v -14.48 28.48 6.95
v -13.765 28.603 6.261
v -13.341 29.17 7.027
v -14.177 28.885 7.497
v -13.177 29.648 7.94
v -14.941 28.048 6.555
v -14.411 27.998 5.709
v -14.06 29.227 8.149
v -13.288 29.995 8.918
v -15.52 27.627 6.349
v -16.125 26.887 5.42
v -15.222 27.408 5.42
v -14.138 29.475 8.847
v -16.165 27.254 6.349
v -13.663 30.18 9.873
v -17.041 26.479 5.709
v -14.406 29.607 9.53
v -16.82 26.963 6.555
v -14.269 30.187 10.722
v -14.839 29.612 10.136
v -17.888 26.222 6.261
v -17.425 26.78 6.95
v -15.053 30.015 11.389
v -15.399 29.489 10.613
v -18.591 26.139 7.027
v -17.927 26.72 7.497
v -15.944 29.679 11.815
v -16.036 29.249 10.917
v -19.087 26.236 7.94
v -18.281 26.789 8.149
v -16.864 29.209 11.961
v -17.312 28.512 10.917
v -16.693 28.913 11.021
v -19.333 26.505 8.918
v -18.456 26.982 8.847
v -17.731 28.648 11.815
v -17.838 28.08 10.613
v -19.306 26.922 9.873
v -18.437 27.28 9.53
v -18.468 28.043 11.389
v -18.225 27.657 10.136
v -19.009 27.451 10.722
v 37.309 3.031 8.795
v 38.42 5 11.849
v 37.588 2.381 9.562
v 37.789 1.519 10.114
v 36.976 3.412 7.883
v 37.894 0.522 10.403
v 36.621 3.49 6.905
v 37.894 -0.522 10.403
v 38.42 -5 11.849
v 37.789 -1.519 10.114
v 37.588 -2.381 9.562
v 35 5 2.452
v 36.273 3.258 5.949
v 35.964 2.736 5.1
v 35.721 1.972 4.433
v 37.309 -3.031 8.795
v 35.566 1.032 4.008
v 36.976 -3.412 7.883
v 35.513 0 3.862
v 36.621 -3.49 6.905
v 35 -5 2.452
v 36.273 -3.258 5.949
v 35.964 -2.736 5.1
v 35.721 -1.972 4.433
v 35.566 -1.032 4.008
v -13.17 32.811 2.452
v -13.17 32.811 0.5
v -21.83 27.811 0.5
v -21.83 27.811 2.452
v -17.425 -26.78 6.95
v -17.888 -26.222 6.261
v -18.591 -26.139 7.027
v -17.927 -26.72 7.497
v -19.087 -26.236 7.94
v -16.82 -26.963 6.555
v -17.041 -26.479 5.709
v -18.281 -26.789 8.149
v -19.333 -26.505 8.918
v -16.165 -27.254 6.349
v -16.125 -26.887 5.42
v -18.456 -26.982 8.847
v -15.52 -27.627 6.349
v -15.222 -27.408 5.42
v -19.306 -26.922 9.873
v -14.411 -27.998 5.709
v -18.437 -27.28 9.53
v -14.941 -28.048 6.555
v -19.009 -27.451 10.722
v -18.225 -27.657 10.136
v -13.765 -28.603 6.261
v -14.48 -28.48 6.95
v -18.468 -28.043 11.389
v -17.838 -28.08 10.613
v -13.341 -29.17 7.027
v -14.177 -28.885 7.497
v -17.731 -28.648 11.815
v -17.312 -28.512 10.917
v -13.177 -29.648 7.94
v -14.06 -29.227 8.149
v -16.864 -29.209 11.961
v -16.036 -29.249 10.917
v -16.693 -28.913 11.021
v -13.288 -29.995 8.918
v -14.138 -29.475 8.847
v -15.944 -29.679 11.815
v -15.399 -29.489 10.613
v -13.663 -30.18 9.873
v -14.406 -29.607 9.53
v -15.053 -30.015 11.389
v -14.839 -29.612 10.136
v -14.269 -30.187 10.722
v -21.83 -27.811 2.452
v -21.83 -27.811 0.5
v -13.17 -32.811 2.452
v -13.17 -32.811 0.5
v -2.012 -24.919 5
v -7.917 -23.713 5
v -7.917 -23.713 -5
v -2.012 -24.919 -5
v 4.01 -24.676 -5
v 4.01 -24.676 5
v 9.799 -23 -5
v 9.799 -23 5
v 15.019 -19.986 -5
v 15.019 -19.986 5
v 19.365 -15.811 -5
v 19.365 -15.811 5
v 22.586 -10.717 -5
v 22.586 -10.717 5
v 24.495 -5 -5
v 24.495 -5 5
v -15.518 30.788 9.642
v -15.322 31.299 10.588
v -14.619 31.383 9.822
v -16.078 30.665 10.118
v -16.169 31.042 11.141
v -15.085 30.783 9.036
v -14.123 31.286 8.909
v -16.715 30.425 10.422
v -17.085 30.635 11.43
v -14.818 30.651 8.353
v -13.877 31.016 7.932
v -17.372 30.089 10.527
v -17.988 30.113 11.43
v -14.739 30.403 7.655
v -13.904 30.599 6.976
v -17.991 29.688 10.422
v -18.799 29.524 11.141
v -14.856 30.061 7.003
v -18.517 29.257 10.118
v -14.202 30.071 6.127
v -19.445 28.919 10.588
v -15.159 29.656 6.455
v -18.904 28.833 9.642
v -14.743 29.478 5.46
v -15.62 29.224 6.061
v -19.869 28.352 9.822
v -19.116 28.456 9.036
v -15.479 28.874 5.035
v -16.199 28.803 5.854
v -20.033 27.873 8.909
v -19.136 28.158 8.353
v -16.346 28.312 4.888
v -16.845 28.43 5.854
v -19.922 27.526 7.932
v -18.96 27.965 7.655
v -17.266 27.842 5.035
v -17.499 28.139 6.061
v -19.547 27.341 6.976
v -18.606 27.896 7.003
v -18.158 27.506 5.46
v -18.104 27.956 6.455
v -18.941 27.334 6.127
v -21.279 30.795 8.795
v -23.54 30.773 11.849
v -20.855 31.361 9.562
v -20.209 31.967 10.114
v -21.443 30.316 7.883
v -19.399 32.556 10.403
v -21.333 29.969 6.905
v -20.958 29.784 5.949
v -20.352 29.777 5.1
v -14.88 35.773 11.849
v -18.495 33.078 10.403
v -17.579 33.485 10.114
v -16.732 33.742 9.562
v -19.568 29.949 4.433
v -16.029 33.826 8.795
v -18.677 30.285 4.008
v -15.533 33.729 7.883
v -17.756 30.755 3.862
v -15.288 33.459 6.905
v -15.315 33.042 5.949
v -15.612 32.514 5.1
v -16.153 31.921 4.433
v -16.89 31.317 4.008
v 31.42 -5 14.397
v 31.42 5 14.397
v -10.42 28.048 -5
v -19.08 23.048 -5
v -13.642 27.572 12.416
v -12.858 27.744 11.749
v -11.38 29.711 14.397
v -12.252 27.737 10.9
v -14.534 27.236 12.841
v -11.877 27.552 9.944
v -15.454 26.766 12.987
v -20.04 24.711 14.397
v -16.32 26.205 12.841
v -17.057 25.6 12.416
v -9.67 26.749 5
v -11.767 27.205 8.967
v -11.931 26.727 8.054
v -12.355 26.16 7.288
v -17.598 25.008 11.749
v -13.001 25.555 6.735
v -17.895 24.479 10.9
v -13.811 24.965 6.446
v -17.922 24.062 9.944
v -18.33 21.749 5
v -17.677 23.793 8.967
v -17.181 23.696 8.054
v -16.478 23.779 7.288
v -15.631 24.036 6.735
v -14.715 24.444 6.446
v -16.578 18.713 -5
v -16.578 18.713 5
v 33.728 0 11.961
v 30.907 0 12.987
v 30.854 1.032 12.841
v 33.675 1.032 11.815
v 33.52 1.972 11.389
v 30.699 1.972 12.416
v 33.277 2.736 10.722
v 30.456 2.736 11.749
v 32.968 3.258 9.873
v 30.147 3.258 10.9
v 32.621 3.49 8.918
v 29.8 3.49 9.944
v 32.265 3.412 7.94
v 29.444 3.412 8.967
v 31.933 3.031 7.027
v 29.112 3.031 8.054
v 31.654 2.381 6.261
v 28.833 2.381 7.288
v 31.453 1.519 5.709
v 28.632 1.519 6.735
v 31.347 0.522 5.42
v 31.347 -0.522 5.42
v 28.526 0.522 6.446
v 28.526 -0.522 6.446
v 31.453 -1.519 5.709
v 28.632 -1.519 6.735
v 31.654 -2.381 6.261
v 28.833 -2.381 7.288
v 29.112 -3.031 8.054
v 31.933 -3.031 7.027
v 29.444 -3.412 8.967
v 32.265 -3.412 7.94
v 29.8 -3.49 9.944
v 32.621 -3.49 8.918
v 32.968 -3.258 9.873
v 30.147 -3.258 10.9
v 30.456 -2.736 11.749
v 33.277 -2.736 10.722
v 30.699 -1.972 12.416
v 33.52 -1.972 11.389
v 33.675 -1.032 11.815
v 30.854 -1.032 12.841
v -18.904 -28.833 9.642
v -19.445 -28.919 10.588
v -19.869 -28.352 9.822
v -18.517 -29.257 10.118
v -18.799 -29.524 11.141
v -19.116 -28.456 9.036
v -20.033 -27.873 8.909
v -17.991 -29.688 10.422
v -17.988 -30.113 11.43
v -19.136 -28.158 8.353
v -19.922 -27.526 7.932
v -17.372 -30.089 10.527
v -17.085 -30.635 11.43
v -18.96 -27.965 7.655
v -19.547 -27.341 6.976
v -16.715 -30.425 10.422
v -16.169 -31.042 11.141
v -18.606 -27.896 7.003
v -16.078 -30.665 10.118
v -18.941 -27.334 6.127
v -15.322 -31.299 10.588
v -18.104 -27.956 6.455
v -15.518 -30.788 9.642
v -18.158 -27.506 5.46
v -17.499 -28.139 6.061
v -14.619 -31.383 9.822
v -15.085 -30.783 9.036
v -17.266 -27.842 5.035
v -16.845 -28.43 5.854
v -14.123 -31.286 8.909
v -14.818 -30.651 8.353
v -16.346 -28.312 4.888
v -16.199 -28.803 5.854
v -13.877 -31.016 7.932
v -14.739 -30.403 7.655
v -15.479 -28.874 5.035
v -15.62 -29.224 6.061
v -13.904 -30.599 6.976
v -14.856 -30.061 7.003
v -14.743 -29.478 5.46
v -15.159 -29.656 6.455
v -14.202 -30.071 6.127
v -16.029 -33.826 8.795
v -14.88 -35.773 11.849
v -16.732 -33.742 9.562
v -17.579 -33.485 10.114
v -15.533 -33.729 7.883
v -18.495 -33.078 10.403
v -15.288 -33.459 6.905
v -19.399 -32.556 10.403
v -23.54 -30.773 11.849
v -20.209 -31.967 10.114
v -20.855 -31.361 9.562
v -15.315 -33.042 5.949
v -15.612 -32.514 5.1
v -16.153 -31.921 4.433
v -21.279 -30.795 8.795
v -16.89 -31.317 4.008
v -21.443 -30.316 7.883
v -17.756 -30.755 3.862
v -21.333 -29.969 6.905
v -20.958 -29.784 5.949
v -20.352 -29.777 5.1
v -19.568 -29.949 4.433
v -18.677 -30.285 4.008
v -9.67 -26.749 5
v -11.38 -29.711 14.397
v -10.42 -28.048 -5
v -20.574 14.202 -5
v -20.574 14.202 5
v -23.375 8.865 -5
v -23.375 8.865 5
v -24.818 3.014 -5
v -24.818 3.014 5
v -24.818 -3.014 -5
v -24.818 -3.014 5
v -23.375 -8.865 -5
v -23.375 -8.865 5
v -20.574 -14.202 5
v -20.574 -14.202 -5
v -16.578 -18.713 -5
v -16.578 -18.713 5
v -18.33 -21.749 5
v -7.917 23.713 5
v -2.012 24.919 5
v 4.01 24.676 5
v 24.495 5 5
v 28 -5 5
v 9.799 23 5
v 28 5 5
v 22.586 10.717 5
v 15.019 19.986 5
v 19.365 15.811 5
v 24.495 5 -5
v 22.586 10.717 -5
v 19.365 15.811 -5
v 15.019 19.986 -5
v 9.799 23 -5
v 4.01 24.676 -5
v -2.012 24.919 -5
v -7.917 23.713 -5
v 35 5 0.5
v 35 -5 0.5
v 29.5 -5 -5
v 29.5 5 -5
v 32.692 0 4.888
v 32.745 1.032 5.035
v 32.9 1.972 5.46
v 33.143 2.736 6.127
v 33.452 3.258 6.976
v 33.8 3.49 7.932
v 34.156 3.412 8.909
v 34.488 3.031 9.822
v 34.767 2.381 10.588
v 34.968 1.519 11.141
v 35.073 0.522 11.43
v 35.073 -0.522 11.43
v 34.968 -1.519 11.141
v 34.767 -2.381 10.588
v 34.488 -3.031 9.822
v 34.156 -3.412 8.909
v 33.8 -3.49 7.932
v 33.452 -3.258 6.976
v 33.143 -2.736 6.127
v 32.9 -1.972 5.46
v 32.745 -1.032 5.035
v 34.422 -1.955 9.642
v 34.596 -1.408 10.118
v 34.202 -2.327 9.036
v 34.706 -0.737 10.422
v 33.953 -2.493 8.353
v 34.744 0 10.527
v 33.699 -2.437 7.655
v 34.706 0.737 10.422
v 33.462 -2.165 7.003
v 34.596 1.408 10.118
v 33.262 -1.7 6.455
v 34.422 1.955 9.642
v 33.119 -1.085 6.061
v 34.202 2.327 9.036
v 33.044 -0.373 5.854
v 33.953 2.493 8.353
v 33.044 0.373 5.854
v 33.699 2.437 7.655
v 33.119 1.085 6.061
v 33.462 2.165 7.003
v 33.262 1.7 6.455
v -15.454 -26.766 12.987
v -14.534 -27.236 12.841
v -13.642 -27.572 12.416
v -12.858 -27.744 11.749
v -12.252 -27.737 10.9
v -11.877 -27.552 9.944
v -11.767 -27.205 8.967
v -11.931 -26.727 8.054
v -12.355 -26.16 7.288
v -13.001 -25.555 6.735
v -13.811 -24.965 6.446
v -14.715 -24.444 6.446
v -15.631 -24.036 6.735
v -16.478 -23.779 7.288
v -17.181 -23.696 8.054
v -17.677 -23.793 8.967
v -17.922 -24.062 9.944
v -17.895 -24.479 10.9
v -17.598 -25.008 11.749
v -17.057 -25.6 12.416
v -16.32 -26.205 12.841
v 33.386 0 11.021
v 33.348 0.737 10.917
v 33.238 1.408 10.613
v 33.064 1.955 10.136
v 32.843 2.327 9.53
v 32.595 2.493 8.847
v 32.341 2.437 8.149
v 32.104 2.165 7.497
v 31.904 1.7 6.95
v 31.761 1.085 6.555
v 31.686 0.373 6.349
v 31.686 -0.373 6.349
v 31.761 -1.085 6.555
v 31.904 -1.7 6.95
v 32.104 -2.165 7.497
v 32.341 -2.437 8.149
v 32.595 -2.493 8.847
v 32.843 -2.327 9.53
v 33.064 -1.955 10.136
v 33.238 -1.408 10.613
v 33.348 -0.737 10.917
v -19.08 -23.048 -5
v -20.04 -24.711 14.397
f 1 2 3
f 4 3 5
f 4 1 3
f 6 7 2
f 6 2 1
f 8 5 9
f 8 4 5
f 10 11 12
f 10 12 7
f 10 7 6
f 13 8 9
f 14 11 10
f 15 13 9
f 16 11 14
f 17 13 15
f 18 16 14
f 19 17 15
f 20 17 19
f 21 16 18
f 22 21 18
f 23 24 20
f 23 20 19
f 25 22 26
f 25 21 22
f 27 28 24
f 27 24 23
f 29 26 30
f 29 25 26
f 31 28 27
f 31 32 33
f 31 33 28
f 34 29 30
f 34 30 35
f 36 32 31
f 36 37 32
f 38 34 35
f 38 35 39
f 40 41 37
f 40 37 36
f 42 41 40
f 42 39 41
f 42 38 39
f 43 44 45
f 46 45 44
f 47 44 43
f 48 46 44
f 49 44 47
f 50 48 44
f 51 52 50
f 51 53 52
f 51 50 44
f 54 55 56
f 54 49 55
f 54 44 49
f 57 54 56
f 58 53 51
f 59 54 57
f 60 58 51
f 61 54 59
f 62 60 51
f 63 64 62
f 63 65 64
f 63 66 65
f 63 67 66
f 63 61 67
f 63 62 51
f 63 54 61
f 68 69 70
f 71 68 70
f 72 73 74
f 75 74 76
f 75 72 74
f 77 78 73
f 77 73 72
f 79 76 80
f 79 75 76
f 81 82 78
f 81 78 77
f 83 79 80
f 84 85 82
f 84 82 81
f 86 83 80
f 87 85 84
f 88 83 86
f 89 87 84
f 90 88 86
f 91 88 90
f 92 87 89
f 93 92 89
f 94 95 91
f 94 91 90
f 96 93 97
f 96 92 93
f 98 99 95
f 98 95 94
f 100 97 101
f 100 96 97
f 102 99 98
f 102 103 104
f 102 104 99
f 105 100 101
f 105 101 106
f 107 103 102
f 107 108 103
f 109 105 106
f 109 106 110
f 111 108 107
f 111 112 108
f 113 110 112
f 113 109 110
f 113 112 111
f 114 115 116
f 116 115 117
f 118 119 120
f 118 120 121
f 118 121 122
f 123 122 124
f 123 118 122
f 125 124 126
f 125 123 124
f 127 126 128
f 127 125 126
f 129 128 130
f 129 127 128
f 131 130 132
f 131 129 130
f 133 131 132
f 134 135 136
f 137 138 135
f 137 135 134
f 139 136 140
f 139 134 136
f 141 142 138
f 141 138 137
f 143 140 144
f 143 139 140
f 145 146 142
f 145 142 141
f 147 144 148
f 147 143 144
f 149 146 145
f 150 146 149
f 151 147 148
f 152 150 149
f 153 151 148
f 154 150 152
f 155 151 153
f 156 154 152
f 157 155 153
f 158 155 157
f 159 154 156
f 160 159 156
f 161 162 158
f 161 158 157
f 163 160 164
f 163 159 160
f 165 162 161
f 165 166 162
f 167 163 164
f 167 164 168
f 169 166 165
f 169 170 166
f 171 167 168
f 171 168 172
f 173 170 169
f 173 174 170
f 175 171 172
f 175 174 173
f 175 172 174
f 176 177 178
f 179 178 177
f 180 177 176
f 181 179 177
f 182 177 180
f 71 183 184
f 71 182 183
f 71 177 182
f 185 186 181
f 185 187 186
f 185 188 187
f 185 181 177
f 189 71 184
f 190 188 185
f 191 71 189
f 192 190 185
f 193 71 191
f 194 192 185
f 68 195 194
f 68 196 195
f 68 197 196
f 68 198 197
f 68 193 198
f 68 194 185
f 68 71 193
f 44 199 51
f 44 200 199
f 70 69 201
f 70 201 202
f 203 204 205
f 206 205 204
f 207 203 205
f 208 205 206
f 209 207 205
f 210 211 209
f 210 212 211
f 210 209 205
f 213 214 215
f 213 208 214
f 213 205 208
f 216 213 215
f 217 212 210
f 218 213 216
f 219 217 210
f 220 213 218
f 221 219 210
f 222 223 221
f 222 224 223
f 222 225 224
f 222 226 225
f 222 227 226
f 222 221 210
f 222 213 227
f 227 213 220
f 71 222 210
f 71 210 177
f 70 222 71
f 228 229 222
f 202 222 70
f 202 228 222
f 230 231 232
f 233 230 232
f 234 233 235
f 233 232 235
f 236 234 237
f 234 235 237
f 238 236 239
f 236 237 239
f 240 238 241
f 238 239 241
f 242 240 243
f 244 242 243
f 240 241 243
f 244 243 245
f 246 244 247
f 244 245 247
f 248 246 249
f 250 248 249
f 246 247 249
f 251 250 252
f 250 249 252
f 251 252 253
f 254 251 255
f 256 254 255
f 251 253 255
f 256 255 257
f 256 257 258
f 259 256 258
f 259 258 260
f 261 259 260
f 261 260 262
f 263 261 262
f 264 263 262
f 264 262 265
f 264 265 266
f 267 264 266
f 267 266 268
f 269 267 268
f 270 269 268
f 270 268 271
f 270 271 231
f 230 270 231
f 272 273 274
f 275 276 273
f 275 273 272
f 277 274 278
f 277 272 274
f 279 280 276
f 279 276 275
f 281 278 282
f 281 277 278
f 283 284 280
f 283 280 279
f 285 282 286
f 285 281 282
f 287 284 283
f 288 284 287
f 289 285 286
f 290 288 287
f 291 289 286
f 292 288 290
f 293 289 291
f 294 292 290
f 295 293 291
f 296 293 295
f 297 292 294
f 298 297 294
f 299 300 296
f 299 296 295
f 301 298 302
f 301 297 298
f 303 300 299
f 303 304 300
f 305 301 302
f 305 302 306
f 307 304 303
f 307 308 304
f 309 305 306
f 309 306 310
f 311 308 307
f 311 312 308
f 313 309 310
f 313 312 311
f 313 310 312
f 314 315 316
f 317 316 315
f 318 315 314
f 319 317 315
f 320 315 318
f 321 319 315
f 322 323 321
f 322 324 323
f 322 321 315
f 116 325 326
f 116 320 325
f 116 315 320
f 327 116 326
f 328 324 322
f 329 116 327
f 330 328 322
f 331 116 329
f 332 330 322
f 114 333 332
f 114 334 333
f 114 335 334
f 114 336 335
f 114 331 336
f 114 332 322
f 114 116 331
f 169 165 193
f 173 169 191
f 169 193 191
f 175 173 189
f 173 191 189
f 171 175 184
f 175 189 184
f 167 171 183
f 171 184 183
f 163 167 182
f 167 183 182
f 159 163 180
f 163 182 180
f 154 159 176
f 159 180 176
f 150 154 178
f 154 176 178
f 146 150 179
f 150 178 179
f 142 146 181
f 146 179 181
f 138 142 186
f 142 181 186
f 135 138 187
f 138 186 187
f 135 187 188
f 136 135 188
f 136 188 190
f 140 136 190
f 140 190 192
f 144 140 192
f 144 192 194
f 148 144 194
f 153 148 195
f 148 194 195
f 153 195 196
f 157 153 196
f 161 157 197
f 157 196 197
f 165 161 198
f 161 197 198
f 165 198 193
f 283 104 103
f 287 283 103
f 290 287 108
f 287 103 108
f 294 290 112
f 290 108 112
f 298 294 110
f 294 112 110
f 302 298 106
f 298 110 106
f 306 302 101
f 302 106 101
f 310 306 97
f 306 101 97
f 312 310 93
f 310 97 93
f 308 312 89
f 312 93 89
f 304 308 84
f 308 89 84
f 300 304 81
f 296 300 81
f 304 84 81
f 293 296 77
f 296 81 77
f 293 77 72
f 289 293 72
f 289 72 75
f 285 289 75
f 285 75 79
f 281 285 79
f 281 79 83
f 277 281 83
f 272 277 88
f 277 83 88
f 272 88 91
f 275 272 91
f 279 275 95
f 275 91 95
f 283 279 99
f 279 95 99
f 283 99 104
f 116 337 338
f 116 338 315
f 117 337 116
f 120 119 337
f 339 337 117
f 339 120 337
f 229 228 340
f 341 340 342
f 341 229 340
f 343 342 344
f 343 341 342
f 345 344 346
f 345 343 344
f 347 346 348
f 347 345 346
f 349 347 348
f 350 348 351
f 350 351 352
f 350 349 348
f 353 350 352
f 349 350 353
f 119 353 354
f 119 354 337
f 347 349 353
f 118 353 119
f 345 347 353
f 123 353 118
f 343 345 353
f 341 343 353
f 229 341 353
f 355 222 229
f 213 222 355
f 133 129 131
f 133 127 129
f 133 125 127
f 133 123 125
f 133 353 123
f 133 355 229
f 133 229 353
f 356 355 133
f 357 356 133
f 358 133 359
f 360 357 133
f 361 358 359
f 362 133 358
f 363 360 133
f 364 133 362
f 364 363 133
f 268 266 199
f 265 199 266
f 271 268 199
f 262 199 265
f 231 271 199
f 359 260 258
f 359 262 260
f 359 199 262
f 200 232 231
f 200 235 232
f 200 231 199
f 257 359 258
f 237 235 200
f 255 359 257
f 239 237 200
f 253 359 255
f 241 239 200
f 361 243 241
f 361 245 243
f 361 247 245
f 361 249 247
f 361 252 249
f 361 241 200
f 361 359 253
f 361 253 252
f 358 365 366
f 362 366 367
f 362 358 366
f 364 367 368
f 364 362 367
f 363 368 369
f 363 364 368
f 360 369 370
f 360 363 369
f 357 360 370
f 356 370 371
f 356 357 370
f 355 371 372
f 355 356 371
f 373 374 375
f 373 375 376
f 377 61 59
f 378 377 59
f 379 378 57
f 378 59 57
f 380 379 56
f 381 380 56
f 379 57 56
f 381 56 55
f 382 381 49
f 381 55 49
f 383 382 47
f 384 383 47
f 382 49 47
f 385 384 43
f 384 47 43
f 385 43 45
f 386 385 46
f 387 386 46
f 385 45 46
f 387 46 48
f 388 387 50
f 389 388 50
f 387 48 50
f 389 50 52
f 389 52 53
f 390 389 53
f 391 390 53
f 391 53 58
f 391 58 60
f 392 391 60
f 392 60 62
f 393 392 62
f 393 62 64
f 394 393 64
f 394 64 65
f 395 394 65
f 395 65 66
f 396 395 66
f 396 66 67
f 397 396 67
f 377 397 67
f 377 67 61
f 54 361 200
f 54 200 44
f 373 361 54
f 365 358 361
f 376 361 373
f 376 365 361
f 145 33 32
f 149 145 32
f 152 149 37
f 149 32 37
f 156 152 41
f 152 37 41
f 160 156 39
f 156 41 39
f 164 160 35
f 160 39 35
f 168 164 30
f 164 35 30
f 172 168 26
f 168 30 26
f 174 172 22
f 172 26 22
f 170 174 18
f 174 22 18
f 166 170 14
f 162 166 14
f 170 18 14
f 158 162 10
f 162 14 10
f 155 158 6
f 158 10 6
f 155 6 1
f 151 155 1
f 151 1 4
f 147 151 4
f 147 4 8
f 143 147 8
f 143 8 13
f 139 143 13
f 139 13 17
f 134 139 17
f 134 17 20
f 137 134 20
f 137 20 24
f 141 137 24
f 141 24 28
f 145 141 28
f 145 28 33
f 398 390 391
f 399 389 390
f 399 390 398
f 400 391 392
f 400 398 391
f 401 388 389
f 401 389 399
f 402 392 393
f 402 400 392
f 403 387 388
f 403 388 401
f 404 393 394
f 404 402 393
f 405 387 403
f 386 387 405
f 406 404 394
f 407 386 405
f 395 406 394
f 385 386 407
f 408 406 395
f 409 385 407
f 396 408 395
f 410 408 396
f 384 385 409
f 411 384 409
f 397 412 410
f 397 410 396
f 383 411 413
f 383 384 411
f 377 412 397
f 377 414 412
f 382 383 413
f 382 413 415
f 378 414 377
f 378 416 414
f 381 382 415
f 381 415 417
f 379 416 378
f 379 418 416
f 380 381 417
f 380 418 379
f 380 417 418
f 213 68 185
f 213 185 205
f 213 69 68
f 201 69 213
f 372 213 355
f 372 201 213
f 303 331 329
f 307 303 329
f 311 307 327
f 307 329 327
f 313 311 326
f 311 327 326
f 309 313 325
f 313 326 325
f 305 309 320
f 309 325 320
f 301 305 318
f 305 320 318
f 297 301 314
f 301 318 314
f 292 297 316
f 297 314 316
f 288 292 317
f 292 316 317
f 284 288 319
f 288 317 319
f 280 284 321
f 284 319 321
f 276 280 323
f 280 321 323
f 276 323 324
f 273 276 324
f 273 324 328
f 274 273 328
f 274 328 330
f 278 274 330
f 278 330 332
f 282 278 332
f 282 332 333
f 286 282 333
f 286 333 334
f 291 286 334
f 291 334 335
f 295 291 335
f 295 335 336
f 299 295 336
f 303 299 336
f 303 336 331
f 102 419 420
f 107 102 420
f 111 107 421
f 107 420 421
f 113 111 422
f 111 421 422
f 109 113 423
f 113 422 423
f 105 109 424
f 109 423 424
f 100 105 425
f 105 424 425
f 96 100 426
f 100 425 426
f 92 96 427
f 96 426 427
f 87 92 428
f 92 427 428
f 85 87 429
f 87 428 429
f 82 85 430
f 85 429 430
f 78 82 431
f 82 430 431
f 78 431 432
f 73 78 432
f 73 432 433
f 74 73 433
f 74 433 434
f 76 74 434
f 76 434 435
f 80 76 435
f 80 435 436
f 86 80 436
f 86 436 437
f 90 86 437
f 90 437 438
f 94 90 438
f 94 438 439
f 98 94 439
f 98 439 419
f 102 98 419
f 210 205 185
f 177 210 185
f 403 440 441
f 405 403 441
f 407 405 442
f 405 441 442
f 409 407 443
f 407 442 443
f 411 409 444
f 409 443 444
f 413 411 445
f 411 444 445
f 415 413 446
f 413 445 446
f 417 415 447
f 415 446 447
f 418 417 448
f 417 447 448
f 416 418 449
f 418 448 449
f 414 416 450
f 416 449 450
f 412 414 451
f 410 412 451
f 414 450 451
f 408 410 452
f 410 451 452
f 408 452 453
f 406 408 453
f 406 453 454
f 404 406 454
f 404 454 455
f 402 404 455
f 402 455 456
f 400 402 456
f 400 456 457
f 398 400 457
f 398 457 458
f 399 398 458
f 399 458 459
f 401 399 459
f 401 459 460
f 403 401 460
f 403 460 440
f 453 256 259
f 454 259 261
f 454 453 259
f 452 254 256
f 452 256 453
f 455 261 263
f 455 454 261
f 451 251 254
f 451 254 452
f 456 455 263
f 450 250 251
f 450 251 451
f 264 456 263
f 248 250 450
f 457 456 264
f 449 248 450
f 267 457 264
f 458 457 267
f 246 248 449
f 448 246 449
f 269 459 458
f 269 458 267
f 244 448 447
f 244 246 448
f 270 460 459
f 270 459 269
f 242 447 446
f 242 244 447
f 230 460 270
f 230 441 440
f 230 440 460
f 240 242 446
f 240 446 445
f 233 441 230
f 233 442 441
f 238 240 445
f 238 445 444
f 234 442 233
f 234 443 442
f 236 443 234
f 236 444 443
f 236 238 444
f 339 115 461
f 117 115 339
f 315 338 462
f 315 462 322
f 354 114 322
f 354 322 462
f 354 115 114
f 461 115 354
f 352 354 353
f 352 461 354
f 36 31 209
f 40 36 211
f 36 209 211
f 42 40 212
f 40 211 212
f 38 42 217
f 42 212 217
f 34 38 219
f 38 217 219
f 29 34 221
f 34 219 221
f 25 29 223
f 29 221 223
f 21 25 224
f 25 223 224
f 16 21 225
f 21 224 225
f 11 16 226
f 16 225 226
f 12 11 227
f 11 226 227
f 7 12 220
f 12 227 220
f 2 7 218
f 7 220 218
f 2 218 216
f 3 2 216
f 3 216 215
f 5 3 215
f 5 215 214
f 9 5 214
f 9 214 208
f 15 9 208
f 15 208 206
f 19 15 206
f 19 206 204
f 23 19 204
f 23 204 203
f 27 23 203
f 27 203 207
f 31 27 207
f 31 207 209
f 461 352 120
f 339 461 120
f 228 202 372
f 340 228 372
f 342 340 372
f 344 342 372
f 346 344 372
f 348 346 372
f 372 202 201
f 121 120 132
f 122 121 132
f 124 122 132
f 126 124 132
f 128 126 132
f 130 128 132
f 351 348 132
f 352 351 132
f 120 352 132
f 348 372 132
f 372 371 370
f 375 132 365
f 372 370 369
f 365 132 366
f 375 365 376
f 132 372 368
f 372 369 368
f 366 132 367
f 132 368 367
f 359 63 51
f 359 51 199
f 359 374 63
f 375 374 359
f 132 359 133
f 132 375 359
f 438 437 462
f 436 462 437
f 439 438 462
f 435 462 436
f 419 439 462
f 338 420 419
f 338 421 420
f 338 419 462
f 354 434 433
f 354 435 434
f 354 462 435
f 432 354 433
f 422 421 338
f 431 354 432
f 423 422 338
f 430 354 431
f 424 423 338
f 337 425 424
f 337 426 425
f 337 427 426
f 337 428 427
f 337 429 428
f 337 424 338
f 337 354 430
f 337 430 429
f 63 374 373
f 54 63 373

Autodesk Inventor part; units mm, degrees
ref_plane "YZ Plane" through (0, 0, 0) normal (1, 0, 0) x (0, 1, 0)
ref_plane "XZ Plane" through (0, 0, 0) normal (0, 1, 0) x (-1, 0, 0)
ref_plane "XY Plane" through (0, 0, 0) normal (0, 0, 1) x (1, 0, 0)
sketch "Sketch1" plane through (0, 0, 0) normal (0, 0, 1) x (1, 0, 0)
  circle A0 centre (0, 0) radius 25
  line L0 (15, -5) -> (35, -5)
  line L1 (35, -5) -> (35, 5)
  line L2 (35, 5) -> (15, 5)
  line L3 (15, 5) -> (15, -5)
  line L4 (15, -5) -> (35, 5) construction
  line L5 (35, -5) -> (15, 5) construction
  point P0 (25, 0)
  dimension "d0" = 50
  dimension "d3" = 10
  dimension "d4" = 20
  dimension "d5" = 0
extrude "Extrusion1" add sketch "Sketch1" along normal mid plane 10 contours A0 L0 L3 L2 | L2 L3 L0 A0
extrude "Extrusion2" add sketch "Sketch1" along normal mid plane 10 contours A0 L0 L3 L2 | A0 L2 L1 L0 picked at (18.3333, 0)
chamfer "Chamfer1" distance 7 angle 20 1 edges at (35, 0, 5) measured on face at (6.5398, 14.4203, 5)
sketch "Sketch2" plane through (28, -5, 5) normal (0.3420201, 0, 0.9396926) x (0.9396926, 0, -0.3420201)
  line L0 (7.4492, 0) -> (0, 0)
  line L1 (0, 0) -> (0, 10)
  line L2 (0, 10) -> (7.4492, 10)
  line L3 (7.4492, 10) -> (7.4492, 0)
  line L4 (7.4492, 0) -> (0, 10) construction
  line L5 (0, 0) -> (7.4492, 10) construction
  line L6 (0, 10) -> (0, 0) projected
  line L7 (7.4492, 0) -> (7.4492, 10) projected
  line L8 (7.4492, 10) -> (0, 10) projected
  line L9 (0, 0) -> (7.4492, 0) projected
  point P0 (-24.6013, 5)
  point P1 (3.7246, 5)
  dimension "d11" = 0
  dimension "d12" = 0
  dimension "d13" = 0
  dimension "d14" = 0
extrude "Extrusion3" add sketch "Sketch2" along normal blind 10
sketch "Sketch3" plane through (28, -5, 5) normal (-0.9396926, 0, 0.3420201) x (0.3420201, 0, 0.9396926)
  circle A0 centre (5, 5) radius 3.5
  line L0 (10, 10) -> (10, 0) projected
  line L1 (0, 10) -> (0, 0) projected
  line L2 (0, 0) -> (10, 0) projected
  line L3 (0, 10) -> (10, 10) projected
  point P0 (-14.275, 5)
  dimension "d17" = 7
  dimension "d18" = 5
  dimension "d19" = 5
  dimension "d20" = 5
  dimension "d21" = 5
extrude "Extrusion5" cut sketch "Sketch3" against normal blind 3 contours A0
sketch "Sketch4" plane through (32.5292, 0, 8.6724) normal (-0.9396926, 0, 0.3420201) x (0.3420201, 0, 0.9396926)
  circle A0 centre (0, 0) radius 2.5
  circle A1 centre (0, 0) radius 3.5 projected
  point P0 (-19.275, 0)
  dimension "d32" = 5
extrude "Extrusion6" cut sketch "Sketch4" against normal through all contours A0
chamfer "Chamfer3" distance 5.5 angle 45 1 edges at (35, 0, -5)
sketch "Sketch5" plane through (35, -5, 2.4522) normal (0.9396926, 0, -0.3420201) x (-0.3420201, 0, -0.9396926)
  circle A0 centre (-5, 5) radius 3.5
  circle A1 centre (-5, 5) radius 2.5 projected
  point P0 (14.275, 5)
  dimension "d35" = 7
extrude "Extrusion7" cut sketch "Sketch5" against normal blind 3
pattern_circular "Circular Pattern1" count 3 over 360 about axis through (0, 0, 0) along (0, 0, 1) of "Extrusion3", "Extrusion2", "Chamfer1", "Extrusion5", "Extrusion6", "Extrusion7", "Chamfer3"
equation "\"d18\" = d19"
equation "\"d20\" = d21"
properties part number "BottomPlatform"
